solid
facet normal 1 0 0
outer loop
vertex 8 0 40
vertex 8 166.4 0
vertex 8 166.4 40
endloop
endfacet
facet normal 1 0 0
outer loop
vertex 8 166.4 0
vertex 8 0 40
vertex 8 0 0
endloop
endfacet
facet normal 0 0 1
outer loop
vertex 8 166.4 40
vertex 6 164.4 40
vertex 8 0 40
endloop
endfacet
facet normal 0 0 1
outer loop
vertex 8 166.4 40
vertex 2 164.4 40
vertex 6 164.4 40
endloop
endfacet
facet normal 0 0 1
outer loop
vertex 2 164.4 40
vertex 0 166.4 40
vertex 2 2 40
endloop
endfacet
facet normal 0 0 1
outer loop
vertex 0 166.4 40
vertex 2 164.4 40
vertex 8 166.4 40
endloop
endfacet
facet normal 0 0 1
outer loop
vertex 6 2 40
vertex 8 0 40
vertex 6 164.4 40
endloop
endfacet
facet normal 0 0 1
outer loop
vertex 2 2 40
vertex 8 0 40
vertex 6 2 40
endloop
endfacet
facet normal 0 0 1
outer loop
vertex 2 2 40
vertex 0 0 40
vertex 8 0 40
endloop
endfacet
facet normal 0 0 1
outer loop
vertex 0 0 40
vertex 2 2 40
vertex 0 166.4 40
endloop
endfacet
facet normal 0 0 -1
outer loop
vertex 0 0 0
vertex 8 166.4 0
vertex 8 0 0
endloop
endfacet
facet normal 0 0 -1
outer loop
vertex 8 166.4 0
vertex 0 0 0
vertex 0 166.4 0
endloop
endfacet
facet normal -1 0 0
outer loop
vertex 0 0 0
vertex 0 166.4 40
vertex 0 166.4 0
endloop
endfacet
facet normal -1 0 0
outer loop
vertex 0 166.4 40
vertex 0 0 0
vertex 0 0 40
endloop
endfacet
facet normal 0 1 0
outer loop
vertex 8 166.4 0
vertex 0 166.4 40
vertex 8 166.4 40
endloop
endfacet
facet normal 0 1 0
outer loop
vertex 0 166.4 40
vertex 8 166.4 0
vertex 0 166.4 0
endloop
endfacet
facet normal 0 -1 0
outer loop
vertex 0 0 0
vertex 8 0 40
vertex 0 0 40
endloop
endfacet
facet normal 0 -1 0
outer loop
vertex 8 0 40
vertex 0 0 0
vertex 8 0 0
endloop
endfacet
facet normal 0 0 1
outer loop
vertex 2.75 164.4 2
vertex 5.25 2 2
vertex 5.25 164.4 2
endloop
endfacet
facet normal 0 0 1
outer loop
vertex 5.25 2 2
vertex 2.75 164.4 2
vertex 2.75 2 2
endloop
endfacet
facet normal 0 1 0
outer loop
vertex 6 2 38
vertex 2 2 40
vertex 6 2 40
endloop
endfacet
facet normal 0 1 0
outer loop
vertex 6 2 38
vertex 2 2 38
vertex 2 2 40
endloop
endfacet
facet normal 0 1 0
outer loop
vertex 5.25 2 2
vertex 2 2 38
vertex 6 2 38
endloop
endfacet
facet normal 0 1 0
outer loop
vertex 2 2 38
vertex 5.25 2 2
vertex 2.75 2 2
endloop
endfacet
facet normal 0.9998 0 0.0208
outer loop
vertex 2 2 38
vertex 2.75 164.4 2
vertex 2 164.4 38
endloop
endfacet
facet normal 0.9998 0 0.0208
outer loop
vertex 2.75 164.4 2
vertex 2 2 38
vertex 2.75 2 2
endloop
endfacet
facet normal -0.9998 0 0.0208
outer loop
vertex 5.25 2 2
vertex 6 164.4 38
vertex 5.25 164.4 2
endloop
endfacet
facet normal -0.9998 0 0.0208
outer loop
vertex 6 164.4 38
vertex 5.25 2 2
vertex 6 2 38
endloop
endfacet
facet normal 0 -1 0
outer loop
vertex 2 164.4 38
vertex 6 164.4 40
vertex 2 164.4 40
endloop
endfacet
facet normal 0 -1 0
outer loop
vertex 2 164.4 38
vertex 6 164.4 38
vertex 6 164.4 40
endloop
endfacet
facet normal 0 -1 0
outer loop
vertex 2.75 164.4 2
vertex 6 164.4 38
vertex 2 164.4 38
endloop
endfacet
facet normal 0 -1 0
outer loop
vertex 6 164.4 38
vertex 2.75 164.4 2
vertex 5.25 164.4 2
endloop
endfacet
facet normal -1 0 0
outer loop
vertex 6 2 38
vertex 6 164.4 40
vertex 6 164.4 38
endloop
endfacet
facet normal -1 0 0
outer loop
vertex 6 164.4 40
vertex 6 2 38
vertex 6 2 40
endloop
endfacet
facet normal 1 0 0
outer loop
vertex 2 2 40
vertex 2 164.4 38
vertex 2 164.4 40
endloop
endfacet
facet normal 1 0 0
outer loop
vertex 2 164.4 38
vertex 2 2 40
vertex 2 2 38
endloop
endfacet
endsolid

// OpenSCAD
// Geschlossenes U-Profil mit verjüngtem Hohlraum und Querschnitt-Option
// Mit geschlossenen Seiten (Endkappen)

// Parameter
oeffnung = 4;            // Breite der U-Öffnung
oeffnung_hinten = 2.5;   // Breite des Hohlraums hinten
hohlraum_laenge = 162.4; // Länge des Hohlraums
tiefe = 40;              // Tiefe des U-Profils
wanddicke = 2;           // Wanddicke
show_cross_section = false; // Auf true setzen, um den Querschnitt zu sehen

// Gesamtlänge und -breite berechnen
gesamt_laenge = hohlraum_laenge + 2*wanddicke; // Gesamtlänge mit Endkappen
gesamtbreite = oeffnung + 2*wanddicke;         // Gesamtbreite des U-Profils

// Das Objekt direkt in der gewünschten Position erstellen ohne Rotation
translate([0, 0, 0]) {
    intersection() {
        difference() {
            // Äußerer Block mit Endkappen (als massiver Block)
            cube([gesamtbreite, gesamt_laenge, tiefe]);
            
            // Innerer Hohlraum mit verjüngender Breite
            translate([wanddicke, wanddicke, wanddicke]) {
                // Der verjüngte Hohlraum mit exakter Länge
                hull() {
                    // Oben: gleiche Breite wie die Öffnung
                    translate([0, 0, tiefe - 2*wanddicke])
                        cube([oeffnung, hohlraum_laenge, 0.01]);
                    
                    // Unten: verjüngt auf definierte Breite, zentriert
                    translate([(oeffnung-oeffnung_hinten)/2, 0, 0])
                        cube([oeffnung_hinten, hohlraum_laenge, 0.01]);
                }
            }
            
            // Offener Bereich an der Oberseite
            translate([wanddicke, wanddicke, tiefe - wanddicke])
                cube([oeffnung, hohlraum_laenge, wanddicke + 0.01]);
        }
        
        // Führe den Schnitt nur durch, wenn show_cross_section = true
        if (show_cross_section) {
            // Schneide das Objekt auf halber Länge
            translate([0, 0, 0])
                cube([gesamtbreite, gesamt_laenge/2, tiefe]);
        } else {
            // Wenn kein Querschnitt gewünscht, nehme das komplette Objekt
            cube([gesamtbreite, gesamt_laenge, tiefe]);
        }
    }
}
